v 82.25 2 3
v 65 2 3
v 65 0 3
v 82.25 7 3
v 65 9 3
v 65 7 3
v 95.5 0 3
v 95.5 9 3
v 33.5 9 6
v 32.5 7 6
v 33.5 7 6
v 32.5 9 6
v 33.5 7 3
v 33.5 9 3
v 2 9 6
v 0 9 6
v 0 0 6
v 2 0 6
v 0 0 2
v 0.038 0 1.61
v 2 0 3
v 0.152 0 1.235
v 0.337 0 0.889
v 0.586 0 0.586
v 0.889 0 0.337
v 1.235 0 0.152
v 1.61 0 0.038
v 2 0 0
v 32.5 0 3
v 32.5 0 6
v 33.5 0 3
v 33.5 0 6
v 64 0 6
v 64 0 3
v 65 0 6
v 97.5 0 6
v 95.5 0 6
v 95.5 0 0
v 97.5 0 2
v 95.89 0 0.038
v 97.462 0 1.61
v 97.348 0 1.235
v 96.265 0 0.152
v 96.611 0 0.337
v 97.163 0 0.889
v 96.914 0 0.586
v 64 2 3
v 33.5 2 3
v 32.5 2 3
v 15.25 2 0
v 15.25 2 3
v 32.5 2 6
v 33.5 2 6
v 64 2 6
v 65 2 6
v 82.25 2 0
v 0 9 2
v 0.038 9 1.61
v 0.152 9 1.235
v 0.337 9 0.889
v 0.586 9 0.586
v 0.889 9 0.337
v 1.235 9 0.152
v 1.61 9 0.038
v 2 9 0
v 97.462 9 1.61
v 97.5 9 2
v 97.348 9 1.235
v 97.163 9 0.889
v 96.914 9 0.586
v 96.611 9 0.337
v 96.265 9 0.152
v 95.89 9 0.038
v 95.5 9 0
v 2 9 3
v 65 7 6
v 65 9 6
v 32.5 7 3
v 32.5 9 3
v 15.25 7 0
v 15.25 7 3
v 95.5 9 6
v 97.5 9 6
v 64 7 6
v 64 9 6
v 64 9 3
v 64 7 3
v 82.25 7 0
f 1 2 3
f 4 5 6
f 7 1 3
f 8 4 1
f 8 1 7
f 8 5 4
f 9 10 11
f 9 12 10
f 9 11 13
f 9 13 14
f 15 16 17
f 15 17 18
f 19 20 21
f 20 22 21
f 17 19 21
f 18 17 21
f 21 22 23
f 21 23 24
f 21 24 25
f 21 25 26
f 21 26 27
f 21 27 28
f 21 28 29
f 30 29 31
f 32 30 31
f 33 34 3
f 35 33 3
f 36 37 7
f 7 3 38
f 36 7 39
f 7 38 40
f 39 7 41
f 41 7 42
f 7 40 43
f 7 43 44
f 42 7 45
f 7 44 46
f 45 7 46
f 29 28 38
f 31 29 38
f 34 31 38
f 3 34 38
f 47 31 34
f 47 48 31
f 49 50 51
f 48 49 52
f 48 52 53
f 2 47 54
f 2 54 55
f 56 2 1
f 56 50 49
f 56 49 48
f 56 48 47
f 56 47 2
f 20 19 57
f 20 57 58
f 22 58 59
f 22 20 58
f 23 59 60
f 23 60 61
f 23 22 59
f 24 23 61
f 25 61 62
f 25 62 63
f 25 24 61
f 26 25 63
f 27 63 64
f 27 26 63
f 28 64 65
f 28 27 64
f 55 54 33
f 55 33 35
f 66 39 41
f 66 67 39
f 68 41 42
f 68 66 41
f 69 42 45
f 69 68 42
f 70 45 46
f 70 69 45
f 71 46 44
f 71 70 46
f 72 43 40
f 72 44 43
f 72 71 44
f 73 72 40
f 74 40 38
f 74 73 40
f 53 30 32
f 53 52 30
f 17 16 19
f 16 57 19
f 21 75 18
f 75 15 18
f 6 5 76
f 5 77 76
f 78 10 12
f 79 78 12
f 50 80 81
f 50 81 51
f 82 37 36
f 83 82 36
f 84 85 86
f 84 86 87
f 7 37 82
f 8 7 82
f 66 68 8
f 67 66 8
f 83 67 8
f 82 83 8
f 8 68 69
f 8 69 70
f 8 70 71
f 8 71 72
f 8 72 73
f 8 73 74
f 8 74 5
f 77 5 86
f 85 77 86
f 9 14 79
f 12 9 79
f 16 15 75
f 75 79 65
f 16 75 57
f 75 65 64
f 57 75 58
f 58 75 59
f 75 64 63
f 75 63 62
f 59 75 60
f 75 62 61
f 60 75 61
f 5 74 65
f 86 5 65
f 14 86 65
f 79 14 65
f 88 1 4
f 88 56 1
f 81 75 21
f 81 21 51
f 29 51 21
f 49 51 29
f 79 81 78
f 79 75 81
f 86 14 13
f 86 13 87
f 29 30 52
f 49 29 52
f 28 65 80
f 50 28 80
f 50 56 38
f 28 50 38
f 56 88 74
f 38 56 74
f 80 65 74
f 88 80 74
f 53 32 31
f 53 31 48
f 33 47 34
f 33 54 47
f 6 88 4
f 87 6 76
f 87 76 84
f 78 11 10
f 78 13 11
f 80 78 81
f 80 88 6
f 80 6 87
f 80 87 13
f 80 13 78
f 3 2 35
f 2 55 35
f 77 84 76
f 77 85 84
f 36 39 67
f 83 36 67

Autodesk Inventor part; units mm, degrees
ref_plane "YZ Plane" through (0, 0, 0) normal (1, 0, 0) x (0, 1, 0)
ref_plane "XZ Plane" through (0, 0, 0) normal (0, 1, 0) x (-1, 0, 0)
ref_plane "XY Plane" through (0, 0, 0) normal (0, 0, 1) x (1, 0, 0)
sketch "Sketch1" plane through (0, 0, 0) normal (0, 0, 1) x (1, 0, 0)
  line L0 (0, 0) -> (97.5, 0)
  line L1 (97.5, 0) -> (97.5, 9)
  line L2 (97.5, 9) -> (0, 9)
  line L3 (0, 9) -> (0, 0)
  dimension "d2" = 97.5
  dimension "d3" = 9
extrude "Extrusion1" add sketch "Sketch1" along normal blind 6
sketch "Sketch2" plane through (0, 0, 6) normal (0, 0, 1) x (1, 0, 0)
  line L0 (0, 0) -> (97.5, 0) projected
  line L1 (97.5, 0) -> (97.5, 9) projected
  line L2 (0, 9) -> (0, 0) projected
  line L3 (2, 0) -> (32.5, 0)
  line L4 (32.5, 0) -> (32.5, 9)
  line L5 (32.5, 9) -> (2, 9)
  line L6 (2, 9) -> (2, 0)
  line L7 (33.5, 9) -> (64, 9)
  line L8 (64, 9) -> (64, 0)
  line L9 (64, 0) -> (33.5, 0)
  line L10 (33.5, 0) -> (33.5, 9)
  line L11 (65, 0) -> (95.5, 0)
  line L12 (95.5, 0) -> (95.5, 9)
  line L13 (95.5, 9) -> (65, 9)
  line L14 (65, 9) -> (65, 0)
  line L15 (97.5, 9) -> (0, 9) projected
  dimension "d5" = 30.5
  dimension "d6" = 2
  dimension "d7" = 2
  dimension "d8" = 30.5
  dimension "d9" = 30.5
  dimension "d10" = 1
extrude "Extrusion2" cut sketch "Sketch2" against normal blind 3 contours L6 L5 L4 L0 | L10 L7 L8 L0 | L14 L13 L12 L0
sketch "Sketch7" plane through (0, 0, 0) normal (0, 0, -1) x (-1, 0, 0)
  line L0 (0, 0) -> (-97.5, 0) projected
  line L1 (0, 9) -> (0, 0) projected
  line L2 (-97.5, 9) -> (0, 9) projected
  line L3 (-97.5, 0) -> (-97.5, 9) projected
  line L4 (-82.25, 7) -> (-15.25, 7)
  line L5 (-15.25, 7) -> (-15.25, 2)
  line L6 (-15.25, 2) -> (-82.25, 2)
  line L7 (-82.25, 2) -> (-82.25, 7)
  line L8 (-82.25, 7) -> (-15.25, 2) construction
  line L9 (-15.25, 7) -> (-82.25, 2) construction
  line L10 (-48.75, 9) -> (-48.75, 0) construction
  line L11 (-97.5, 4.5) -> (0, 4.5) construction
  point P0 (-48.75, 4.5)
  point P1 (-48.75, 4.5)
  point P2 (-48.75, 4.5)
  dimension "d31" = 67
  dimension "d32" = 5
extrude "Extrusion7" cut sketch "Sketch7" against normal blind 10 contours L4 L5 L6 L7
fillet "Fillet1" radius 2 2 edges at (97.5, 4.5, 0) (0, 4.5, 0)
properties part number "base_corner" material "ABS Plastic"
